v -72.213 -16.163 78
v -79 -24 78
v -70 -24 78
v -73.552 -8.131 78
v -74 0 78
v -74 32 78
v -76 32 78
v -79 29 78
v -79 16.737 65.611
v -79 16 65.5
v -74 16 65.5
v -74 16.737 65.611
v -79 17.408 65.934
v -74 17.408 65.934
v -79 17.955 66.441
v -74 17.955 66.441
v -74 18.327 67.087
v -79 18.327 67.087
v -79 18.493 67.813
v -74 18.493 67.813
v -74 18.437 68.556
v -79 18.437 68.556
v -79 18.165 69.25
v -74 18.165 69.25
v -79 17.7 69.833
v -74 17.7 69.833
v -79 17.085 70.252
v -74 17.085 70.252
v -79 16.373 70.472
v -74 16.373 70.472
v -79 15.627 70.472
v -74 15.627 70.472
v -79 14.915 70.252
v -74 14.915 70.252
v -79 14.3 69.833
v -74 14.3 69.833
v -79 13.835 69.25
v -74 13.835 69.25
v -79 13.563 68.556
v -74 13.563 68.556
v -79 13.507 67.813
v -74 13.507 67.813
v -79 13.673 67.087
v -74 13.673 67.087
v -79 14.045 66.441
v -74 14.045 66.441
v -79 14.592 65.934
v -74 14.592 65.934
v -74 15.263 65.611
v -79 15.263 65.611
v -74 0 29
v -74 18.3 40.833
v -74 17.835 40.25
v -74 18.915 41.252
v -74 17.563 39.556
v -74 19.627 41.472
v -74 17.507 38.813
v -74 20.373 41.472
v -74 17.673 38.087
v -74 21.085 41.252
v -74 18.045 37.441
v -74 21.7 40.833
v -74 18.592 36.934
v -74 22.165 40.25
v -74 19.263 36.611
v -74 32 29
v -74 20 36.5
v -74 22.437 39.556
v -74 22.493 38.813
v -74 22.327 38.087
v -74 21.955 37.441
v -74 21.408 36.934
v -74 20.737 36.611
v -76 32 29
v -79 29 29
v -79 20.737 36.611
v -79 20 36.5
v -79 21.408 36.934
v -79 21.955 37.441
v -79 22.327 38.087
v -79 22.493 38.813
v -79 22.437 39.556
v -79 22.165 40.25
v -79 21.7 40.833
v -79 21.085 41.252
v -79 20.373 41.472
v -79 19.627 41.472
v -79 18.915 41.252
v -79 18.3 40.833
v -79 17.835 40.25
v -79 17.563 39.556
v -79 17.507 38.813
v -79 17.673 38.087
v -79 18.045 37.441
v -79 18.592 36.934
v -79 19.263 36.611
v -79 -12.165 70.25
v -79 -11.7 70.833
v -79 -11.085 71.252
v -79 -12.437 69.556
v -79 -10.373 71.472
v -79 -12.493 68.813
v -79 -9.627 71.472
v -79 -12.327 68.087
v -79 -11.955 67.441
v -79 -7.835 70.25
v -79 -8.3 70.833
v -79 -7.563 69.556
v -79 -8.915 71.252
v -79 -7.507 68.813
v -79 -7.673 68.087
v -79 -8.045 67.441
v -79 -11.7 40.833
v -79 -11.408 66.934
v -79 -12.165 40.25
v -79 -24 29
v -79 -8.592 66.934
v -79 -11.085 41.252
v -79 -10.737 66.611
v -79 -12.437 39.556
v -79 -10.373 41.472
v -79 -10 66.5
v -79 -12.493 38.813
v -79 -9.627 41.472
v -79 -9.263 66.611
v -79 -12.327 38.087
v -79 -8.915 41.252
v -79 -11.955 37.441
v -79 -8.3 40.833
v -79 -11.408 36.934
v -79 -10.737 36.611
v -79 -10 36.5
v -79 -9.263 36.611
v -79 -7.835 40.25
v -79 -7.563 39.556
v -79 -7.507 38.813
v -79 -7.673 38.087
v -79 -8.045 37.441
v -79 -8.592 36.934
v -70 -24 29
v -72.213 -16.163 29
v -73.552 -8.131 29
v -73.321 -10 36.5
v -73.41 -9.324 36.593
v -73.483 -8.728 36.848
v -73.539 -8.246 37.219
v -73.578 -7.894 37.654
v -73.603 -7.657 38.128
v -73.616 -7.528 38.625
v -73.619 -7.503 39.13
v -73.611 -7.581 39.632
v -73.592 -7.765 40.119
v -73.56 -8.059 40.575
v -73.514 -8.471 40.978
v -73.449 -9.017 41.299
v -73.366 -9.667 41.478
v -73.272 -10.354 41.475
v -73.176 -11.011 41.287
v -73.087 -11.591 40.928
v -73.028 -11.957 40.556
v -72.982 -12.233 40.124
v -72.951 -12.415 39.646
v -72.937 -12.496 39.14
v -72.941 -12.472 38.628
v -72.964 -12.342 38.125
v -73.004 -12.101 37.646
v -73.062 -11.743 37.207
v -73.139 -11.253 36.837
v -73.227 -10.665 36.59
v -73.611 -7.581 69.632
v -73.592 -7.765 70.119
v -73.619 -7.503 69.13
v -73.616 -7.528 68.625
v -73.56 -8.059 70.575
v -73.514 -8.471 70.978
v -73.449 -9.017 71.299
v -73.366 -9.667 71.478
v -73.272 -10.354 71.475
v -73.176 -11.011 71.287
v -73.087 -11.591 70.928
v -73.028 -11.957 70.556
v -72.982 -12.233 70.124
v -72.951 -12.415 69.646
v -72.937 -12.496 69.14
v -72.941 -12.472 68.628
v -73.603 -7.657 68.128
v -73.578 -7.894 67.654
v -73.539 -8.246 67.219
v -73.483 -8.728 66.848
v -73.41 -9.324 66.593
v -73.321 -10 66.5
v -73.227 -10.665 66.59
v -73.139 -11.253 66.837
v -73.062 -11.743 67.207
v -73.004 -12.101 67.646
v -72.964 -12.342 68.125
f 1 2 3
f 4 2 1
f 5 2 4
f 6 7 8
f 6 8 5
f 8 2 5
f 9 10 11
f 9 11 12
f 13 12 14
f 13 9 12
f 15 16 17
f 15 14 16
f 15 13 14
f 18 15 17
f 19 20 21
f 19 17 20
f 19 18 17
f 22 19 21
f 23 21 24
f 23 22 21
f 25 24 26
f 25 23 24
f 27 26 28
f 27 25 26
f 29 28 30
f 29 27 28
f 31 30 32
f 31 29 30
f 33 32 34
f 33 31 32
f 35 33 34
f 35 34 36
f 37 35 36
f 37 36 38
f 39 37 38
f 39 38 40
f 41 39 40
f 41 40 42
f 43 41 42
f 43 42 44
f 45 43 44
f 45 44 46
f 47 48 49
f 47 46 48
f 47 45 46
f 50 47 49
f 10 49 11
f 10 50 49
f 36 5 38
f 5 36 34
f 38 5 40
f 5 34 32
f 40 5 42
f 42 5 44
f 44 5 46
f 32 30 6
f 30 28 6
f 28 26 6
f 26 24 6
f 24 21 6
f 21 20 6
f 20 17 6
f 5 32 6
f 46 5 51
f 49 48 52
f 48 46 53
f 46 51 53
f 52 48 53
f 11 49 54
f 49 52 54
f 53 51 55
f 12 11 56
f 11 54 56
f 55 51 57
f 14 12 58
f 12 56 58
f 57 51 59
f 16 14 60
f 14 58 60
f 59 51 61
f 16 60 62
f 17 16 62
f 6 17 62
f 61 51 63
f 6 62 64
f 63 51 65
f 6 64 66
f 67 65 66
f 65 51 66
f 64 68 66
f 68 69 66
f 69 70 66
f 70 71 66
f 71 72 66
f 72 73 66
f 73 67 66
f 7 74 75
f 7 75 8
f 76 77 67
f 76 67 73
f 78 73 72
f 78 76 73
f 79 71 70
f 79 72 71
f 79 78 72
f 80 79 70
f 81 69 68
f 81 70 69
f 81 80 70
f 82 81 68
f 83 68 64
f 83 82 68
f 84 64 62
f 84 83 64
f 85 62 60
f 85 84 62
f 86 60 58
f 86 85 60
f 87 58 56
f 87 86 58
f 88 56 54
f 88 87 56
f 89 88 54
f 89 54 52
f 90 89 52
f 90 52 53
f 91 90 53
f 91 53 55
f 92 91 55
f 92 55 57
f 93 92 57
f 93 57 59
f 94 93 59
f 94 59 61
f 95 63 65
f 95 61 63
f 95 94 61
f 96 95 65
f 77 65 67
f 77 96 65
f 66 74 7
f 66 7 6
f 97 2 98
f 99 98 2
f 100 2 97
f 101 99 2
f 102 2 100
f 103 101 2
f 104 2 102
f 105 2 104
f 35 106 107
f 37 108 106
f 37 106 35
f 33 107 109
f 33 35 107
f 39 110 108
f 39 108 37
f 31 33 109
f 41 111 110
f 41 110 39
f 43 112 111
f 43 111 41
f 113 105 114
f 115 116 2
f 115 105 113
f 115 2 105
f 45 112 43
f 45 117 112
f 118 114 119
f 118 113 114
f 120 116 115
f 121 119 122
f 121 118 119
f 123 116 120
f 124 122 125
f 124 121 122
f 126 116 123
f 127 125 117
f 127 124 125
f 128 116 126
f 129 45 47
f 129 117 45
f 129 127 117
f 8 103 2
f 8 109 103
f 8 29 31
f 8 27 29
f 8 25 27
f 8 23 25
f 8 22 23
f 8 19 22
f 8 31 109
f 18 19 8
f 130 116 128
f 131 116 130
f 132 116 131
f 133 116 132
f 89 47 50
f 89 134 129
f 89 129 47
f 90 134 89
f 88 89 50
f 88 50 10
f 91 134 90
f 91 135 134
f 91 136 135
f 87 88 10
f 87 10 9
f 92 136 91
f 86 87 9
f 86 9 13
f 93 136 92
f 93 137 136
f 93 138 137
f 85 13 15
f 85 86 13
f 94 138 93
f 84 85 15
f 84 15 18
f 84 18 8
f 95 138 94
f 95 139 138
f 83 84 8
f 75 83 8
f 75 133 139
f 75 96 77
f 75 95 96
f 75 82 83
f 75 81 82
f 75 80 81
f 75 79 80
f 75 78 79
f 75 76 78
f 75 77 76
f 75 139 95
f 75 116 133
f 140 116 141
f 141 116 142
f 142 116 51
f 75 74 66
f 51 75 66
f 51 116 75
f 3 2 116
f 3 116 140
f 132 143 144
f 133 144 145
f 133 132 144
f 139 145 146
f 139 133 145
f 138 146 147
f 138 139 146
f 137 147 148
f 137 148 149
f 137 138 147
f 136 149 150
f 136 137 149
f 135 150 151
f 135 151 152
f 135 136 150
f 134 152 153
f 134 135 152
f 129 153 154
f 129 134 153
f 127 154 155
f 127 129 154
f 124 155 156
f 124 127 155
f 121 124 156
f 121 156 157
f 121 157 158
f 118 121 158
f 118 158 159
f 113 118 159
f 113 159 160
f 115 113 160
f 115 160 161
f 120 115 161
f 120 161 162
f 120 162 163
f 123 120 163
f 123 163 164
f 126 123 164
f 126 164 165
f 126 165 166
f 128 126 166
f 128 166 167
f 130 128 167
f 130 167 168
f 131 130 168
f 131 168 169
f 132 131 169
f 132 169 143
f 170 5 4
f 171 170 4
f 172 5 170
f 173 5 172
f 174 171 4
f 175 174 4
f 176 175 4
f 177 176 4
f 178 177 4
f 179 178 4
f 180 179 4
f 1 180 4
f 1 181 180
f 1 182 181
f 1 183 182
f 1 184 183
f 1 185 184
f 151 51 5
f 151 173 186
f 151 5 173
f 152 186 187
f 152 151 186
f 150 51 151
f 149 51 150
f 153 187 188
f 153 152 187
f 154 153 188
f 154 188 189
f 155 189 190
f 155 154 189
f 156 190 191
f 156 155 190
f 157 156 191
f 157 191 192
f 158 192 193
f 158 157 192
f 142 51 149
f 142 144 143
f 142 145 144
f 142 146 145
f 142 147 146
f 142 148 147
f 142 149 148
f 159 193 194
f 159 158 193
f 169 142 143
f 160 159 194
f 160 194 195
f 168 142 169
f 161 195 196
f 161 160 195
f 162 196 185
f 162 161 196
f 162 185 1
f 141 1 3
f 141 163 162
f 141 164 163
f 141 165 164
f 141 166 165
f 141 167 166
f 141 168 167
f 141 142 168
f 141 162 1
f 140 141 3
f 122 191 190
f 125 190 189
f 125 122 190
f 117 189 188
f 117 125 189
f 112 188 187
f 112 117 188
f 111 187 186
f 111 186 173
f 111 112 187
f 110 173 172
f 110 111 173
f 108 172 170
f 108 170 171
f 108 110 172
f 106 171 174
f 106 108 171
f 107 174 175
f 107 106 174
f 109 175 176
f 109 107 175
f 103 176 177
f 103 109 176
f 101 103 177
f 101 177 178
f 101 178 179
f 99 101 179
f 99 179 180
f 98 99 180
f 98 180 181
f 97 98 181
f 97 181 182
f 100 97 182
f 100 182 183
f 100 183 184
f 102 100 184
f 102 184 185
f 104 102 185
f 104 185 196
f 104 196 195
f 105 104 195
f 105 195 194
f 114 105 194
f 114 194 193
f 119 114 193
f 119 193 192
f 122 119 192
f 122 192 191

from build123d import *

# Parameters (mm, degrees)
BOX764_W           = 148
BOX764_H           = 74
BOX764_DEPTH       = 55
CYLINDER1805_R     = 74
CYLINDER1805_DEPTH = 60
CYLINDER1810_R     = 2.5
CYLINDER1810_DEPTH = 40
CYLINDER1806_R     = 2.5
CYLINDER1806_DEPTH = 40
CYLINDER1885_R     = 2.5
CYLINDER1885_DEPTH = 40
CYLINDER1809_R     = 2.5
CYLINDER1809_DEPTH = 40
BOX769_W           = 10
BOX769_H           = 56
BOX769_DEPTH       = 49
CHAMFER065_SIZE    = 3


with BuildPart() as krychle764:
    # Box764 → Box764 (new body)
    with BuildSketch(Plane(origin=(-74, 0, 29), x_dir=(1, 0, 0), z_dir=(0, 0, 1))):
        with Locations((74, 37)):
            Rectangle(BOX764_W, BOX764_H)
    extrude(amount=BOX764_DEPTH)


with BuildPart() as v_lec1805:
    # Cylinder1805 → Cylinder1805 (new body)
    with BuildSketch(Plane.XY.offset(26)):
        Circle(CYLINDER1805_R)
    extrude(amount=CYLINDER1805_DEPTH)


with BuildPart() as v_lec1810:
    # Cylinder1810 → Cylinder1810 (new body)
    with BuildSketch(Plane(origin=(-86, 20, 39), x_dir=(0, 0, -1), z_dir=(1, 0, 0))):
        Circle(CYLINDER1810_R)
    extrude(amount=CYLINDER1810_DEPTH)


with BuildPart() as v_lec1806:
    # Cylinder1806 → Cylinder1806 (new body)
    with BuildSketch(Plane(origin=(-86, -10, 69), x_dir=(0, 0, -1), z_dir=(1, 0, 0))):
        Circle(CYLINDER1806_R)
    extrude(amount=CYLINDER1806_DEPTH)


with BuildPart() as v_lec1885:
    # Cylinder1885 → Cylinder1885 (new body)
    with BuildSketch(Plane(origin=(-86, 16, 68), x_dir=(0, 0, -1), z_dir=(1, 0, 0))):
        Circle(CYLINDER1885_R)
    extrude(amount=CYLINDER1885_DEPTH)


with BuildPart() as compound919:
    # Cylinder1809 → Cylinder1809 (new body)
    with BuildSketch(Plane(origin=(-86, -10, 39), x_dir=(0, 0, -1), z_dir=(1, 0, 0))):
        Circle(CYLINDER1809_R)
    extrude(amount=CYLINDER1809_DEPTH)

    # Compound919: union Válec1810, Válec1806, Válec1885
    add(v_lec1810.part)
    add(v_lec1806.part)
    add(v_lec1885.part)


with BuildPart() as cut568:
    # Box769 → Box769 (new body)
    with BuildSketch(Plane(origin=(-79, -24, 29), x_dir=(1, 0, 0), z_dir=(0, 0, 1))):
        with Locations((5, 28)):
            Rectangle(BOX769_W, BOX769_H)
    extrude(amount=BOX769_DEPTH)

    # Chamfer065
    chamfer065_edges = [cut568.edges().sort_by_distance(p)[0] for p in [
        (-79, 32, 53.5),
    ]]
    chamfer(chamfer065_edges, length=CHAMFER065_SIZE)

    # Cut556: cut Compound919
    add(compound919.part, mode=Mode.SUBTRACT)

    # Cut557: cut Válec1805
    add(v_lec1805.part, mode=Mode.SUBTRACT)

    # Cut568: cut Krychle764
    add(krychle764.part, mode=Mode.SUBTRACT)


solid = cut568.part
